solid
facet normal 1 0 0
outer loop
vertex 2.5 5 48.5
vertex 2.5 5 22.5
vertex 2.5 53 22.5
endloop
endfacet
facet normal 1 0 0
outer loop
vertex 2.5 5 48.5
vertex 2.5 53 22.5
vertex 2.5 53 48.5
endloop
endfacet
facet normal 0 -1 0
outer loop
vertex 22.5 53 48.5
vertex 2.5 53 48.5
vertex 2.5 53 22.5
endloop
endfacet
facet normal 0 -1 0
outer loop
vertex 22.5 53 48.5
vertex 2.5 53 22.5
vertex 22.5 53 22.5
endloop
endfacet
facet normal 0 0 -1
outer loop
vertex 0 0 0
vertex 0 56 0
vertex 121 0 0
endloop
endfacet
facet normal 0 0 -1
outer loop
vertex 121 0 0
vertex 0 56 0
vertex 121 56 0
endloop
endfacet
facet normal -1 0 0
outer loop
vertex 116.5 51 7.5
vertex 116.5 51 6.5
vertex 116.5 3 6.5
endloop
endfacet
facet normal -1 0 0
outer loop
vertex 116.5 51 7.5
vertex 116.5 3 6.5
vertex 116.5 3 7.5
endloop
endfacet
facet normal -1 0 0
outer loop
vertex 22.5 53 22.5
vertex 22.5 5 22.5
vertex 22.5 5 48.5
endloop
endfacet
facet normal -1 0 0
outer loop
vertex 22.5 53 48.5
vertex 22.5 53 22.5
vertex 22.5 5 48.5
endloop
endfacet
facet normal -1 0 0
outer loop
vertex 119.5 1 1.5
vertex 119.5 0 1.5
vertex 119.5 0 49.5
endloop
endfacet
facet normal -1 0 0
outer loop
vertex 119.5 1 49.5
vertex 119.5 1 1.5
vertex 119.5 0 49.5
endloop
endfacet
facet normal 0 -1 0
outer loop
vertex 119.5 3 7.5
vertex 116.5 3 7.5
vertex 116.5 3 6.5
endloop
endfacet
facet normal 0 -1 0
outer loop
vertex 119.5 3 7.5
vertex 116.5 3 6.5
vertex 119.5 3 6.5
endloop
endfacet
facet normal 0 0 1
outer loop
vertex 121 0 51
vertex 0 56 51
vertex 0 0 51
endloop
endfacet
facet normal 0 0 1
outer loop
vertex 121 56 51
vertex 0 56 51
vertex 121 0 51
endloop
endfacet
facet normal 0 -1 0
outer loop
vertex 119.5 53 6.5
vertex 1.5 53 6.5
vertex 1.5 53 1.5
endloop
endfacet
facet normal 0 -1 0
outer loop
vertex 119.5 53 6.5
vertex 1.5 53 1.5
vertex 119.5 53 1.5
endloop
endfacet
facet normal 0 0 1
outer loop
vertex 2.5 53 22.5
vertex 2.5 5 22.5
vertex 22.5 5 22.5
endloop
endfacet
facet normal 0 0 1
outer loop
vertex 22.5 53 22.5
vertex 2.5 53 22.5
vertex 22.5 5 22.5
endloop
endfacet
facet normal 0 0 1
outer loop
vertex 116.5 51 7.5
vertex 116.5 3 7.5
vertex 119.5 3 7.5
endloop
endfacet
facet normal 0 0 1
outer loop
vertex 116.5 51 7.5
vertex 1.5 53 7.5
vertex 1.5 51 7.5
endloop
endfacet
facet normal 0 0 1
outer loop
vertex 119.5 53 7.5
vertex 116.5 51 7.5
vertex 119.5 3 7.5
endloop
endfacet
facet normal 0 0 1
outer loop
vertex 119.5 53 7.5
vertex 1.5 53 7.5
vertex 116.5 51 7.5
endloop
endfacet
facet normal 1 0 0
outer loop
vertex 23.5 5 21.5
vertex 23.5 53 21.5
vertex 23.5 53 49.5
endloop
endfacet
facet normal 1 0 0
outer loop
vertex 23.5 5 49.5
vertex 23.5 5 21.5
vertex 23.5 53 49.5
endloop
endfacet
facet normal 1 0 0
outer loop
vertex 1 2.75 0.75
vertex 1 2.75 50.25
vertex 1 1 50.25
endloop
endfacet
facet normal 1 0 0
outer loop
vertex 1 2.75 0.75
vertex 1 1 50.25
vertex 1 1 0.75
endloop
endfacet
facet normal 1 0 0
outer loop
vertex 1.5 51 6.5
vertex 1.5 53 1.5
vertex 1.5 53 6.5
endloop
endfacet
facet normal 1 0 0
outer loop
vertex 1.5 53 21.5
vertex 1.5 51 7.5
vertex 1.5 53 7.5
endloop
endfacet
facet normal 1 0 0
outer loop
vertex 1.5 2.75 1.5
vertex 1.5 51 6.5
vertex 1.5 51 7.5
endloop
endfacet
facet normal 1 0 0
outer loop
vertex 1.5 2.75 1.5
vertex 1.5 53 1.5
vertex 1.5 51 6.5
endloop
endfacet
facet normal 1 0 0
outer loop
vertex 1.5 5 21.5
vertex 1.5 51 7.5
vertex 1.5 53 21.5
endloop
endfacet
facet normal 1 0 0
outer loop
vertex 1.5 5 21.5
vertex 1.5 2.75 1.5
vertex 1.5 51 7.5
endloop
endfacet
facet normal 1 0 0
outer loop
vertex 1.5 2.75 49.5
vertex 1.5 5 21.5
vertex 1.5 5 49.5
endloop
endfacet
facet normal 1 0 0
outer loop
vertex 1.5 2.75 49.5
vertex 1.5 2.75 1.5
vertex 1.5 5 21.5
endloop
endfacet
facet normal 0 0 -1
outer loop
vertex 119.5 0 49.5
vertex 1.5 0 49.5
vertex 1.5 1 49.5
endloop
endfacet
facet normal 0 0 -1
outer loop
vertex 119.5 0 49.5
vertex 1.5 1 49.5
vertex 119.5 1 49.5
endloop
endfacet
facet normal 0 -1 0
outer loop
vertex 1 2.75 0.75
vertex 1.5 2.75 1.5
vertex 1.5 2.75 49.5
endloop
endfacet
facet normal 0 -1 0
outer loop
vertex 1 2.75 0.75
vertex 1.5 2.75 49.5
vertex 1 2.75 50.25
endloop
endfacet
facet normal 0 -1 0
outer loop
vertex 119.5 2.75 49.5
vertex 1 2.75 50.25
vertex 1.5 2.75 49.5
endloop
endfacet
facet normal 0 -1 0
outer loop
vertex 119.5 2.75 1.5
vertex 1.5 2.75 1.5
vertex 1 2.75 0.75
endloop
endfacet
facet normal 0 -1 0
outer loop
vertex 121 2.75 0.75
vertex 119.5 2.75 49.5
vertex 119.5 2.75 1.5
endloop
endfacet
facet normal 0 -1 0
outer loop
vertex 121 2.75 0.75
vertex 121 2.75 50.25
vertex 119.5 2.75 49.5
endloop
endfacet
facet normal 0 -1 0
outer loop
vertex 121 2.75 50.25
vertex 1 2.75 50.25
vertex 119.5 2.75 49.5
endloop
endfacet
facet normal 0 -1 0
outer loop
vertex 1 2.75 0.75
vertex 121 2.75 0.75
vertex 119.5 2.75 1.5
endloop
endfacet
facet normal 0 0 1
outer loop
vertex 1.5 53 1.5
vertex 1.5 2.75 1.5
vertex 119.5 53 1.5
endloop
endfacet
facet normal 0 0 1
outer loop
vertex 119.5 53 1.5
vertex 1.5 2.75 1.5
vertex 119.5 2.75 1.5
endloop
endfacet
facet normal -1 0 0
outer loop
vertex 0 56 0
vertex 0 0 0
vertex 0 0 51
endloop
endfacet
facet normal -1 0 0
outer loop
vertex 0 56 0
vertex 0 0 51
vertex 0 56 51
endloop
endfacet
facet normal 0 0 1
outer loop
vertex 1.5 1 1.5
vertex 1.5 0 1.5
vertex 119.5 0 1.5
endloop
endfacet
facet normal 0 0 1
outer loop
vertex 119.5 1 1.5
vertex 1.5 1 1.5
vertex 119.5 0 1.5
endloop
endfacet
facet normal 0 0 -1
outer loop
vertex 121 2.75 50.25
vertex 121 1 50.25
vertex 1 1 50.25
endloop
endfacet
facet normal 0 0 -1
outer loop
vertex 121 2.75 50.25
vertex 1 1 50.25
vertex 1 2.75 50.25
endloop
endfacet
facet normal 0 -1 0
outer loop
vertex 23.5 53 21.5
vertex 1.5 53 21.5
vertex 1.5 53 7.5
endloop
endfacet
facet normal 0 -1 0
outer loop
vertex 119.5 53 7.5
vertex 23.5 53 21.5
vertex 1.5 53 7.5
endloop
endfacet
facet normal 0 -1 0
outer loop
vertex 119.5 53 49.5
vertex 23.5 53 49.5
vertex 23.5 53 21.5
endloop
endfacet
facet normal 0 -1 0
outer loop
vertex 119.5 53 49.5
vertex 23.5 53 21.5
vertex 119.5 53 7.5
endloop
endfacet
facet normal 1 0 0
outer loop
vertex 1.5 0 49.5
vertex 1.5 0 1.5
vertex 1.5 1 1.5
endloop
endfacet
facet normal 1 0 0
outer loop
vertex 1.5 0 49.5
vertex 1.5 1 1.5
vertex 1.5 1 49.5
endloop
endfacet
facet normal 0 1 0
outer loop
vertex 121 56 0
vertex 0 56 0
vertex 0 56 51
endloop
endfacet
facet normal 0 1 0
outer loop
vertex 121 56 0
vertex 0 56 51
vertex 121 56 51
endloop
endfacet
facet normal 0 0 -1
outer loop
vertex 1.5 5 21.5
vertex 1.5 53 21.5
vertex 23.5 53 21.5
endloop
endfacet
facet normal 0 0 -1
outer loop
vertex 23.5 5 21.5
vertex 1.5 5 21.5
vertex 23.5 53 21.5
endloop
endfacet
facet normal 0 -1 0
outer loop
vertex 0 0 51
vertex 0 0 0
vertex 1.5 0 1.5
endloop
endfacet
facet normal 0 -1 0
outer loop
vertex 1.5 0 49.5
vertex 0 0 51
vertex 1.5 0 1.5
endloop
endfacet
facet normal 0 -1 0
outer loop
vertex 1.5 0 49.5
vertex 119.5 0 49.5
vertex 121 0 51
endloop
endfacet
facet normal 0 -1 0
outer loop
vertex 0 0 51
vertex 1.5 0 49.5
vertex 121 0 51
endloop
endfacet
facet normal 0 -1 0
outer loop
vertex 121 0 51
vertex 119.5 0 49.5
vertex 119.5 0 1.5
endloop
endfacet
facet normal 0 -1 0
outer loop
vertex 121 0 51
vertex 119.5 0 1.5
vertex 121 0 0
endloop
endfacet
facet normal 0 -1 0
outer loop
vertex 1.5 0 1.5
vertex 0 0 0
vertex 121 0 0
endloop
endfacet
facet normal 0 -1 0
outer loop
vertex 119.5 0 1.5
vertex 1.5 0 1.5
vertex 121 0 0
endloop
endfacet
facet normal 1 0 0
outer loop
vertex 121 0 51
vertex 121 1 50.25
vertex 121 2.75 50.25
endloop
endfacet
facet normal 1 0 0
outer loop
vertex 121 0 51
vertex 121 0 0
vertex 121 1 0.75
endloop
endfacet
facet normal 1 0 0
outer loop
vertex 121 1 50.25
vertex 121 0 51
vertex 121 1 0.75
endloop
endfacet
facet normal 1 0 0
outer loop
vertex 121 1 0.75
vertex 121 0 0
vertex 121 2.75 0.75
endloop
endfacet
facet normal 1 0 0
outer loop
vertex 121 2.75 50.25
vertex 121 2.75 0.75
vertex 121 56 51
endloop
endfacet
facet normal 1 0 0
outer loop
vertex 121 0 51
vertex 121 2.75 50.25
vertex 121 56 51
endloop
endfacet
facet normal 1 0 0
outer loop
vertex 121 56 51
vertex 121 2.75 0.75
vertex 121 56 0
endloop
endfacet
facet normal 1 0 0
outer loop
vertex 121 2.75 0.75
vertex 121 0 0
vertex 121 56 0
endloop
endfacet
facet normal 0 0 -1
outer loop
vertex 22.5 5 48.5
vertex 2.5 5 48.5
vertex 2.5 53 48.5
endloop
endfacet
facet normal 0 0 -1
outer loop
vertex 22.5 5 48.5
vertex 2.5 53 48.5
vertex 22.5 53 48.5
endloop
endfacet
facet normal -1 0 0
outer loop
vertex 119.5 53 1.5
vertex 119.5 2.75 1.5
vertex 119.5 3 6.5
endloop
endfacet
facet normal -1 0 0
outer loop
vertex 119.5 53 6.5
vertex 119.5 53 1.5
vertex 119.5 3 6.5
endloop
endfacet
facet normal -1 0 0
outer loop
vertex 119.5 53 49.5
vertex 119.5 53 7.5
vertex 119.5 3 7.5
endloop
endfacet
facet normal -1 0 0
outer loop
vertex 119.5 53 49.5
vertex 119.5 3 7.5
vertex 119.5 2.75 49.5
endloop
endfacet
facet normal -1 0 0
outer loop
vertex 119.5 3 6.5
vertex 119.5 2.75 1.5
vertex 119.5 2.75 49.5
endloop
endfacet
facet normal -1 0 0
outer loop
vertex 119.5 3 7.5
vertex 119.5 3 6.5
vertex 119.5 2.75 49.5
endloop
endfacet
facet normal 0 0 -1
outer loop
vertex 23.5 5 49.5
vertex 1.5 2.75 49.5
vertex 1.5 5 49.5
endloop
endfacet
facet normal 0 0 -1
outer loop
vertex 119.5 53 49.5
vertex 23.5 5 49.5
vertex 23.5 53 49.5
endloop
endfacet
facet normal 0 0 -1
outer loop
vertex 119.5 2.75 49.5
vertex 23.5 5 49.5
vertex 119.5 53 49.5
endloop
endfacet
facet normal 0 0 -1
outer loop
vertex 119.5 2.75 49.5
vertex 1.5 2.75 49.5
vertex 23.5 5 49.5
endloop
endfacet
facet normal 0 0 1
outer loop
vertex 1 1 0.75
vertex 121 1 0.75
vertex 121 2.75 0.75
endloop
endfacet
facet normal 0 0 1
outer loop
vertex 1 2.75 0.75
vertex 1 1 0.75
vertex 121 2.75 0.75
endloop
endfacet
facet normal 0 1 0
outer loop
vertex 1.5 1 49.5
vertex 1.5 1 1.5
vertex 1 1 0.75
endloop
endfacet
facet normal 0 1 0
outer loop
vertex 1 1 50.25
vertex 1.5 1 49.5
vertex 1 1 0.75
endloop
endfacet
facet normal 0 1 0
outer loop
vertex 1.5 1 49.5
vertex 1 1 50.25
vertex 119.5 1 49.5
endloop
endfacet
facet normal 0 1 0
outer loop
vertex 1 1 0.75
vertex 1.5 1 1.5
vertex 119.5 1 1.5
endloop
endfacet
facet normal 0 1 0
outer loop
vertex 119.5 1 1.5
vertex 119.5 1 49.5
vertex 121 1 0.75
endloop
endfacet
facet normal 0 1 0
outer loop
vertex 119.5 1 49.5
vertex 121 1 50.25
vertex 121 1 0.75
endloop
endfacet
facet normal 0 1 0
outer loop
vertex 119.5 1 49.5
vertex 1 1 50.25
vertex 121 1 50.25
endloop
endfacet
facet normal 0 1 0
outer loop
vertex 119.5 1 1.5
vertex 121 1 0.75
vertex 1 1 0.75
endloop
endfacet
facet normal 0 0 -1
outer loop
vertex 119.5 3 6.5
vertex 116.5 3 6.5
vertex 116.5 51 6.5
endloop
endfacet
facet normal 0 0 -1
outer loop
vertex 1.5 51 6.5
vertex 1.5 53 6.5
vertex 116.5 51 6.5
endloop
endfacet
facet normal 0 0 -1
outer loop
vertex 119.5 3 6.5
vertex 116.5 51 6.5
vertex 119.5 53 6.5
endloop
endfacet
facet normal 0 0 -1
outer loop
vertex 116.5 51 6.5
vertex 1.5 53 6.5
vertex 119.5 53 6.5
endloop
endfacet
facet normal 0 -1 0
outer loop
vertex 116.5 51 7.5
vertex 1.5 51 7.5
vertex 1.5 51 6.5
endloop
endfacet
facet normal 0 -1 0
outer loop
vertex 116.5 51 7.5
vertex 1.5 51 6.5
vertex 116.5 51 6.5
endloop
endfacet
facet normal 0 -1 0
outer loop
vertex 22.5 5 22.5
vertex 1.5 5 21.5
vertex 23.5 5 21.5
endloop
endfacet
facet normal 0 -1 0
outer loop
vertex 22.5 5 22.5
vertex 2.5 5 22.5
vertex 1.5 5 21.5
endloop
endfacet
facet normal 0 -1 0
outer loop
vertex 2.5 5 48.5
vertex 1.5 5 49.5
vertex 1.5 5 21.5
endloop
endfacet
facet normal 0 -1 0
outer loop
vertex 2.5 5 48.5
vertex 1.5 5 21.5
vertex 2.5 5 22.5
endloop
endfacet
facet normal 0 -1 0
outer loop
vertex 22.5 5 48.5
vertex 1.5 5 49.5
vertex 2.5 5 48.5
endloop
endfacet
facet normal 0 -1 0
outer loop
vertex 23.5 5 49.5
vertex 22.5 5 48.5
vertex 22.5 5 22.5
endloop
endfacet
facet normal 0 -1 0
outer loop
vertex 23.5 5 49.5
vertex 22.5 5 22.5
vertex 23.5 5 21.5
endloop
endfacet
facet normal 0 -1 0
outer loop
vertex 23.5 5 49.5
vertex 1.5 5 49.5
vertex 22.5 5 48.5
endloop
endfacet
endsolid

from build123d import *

# Parameters (mm, degrees)
SCHIZZO1_W                   = 121
SCHIZZO1_H                   = 56
ESTRUSIONE_ESTRUSIONE4_DEPTH = 51
SCHIZZO6_W                   = 118
SCHIZZO6_H                   = 48
TAGLIO_ESTRUSIONE2_DEPTH     = 53
SCHIZZO7_W                   = 22
SCHIZZO7_H                   = 28
ESTRUSIONE_ESTRUSIONE5_DEPTH = 48
SCHIZZO13_W                  = 20
SCHIZZO13_H                  = 26
TAGLIO_ESTRUSIONE3_DEPTH     = 48
SCHIZZO15_W                  = 118
SCHIZZO15_H                  = 1
ESTRUSIONE_ESTRUSIONE6_DEPTH = 2
SCHIZZO16_W                  = 3
SCHIZZO16_H                  = 1
ESTRUSIONE_ESTRUSIONE7_DEPTH = 48
SCHIZZO17_W                  = 49.5
SCHIZZO17_H                  = 1.75
TAGLIO_ESTRUSIONE4_DEPTH     = 120


with BuildPart() as part:
    # Schizzo1 → Estrusione-Estrusione4 (new body)
    with BuildSketch(Plane.XY):
        with Locations((60.5, 28)):
            Rectangle(SCHIZZO1_W, SCHIZZO1_H)
    extrude(amount=ESTRUSIONE_ESTRUSIONE4_DEPTH)

    # Schizzo6 → Taglio-Estrusione2 (cut)
    with BuildSketch(Plane.XZ):
        with Locations((60.5, 25.5)):
            Rectangle(SCHIZZO6_W, SCHIZZO6_H)
    extrude(amount=-TAGLIO_ESTRUSIONE2_DEPTH, mode=Mode.SUBTRACT)

    # Schizzo7 → Estrusione-Estrusione5 (add)
    with BuildSketch(Plane.XZ.offset(-53)):
        with Locations((12.5, 35.5)):
            Rectangle(SCHIZZO7_W, SCHIZZO7_H)
    extrude(amount=ESTRUSIONE_ESTRUSIONE5_DEPTH)

    # Schizzo13 → Taglio-Estrusione3 (cut)
    with BuildSketch(Plane.XZ.offset(-5)):
        with Locations((12.5, 35.5)):
            Rectangle(SCHIZZO13_W, SCHIZZO13_H)
    extrude(amount=-TAGLIO_ESTRUSIONE3_DEPTH, mode=Mode.SUBTRACT)

    # Schizzo15 → Estrusione-Estrusione6 (add)
    with BuildSketch(Plane.XZ.offset(-53)):
        with Locations((60.5, 7)):
            Rectangle(SCHIZZO15_W, SCHIZZO15_H)
    extrude(amount=ESTRUSIONE_ESTRUSIONE6_DEPTH)

    # Schizzo16 → Estrusione-Estrusione7 (add)
    with BuildSketch(Plane.XZ.offset(-51)):
        with Locations((118, 7)):
            Rectangle(SCHIZZO16_W, SCHIZZO16_H)
    extrude(amount=ESTRUSIONE_ESTRUSIONE7_DEPTH)

    # Schizzo17 → Taglio-Estrusione4 (cut)
    with BuildSketch(Plane(origin=(121, 0, 0), x_dir=(0, 0, -1), z_dir=(1, 0, 0))):
        with Locations((-25.5, 1.875)):
            Rectangle(SCHIZZO17_W, SCHIZZO17_H)
    extrude(amount=-TAGLIO_ESTRUSIONE4_DEPTH, mode=Mode.SUBTRACT)


solid = part.part
